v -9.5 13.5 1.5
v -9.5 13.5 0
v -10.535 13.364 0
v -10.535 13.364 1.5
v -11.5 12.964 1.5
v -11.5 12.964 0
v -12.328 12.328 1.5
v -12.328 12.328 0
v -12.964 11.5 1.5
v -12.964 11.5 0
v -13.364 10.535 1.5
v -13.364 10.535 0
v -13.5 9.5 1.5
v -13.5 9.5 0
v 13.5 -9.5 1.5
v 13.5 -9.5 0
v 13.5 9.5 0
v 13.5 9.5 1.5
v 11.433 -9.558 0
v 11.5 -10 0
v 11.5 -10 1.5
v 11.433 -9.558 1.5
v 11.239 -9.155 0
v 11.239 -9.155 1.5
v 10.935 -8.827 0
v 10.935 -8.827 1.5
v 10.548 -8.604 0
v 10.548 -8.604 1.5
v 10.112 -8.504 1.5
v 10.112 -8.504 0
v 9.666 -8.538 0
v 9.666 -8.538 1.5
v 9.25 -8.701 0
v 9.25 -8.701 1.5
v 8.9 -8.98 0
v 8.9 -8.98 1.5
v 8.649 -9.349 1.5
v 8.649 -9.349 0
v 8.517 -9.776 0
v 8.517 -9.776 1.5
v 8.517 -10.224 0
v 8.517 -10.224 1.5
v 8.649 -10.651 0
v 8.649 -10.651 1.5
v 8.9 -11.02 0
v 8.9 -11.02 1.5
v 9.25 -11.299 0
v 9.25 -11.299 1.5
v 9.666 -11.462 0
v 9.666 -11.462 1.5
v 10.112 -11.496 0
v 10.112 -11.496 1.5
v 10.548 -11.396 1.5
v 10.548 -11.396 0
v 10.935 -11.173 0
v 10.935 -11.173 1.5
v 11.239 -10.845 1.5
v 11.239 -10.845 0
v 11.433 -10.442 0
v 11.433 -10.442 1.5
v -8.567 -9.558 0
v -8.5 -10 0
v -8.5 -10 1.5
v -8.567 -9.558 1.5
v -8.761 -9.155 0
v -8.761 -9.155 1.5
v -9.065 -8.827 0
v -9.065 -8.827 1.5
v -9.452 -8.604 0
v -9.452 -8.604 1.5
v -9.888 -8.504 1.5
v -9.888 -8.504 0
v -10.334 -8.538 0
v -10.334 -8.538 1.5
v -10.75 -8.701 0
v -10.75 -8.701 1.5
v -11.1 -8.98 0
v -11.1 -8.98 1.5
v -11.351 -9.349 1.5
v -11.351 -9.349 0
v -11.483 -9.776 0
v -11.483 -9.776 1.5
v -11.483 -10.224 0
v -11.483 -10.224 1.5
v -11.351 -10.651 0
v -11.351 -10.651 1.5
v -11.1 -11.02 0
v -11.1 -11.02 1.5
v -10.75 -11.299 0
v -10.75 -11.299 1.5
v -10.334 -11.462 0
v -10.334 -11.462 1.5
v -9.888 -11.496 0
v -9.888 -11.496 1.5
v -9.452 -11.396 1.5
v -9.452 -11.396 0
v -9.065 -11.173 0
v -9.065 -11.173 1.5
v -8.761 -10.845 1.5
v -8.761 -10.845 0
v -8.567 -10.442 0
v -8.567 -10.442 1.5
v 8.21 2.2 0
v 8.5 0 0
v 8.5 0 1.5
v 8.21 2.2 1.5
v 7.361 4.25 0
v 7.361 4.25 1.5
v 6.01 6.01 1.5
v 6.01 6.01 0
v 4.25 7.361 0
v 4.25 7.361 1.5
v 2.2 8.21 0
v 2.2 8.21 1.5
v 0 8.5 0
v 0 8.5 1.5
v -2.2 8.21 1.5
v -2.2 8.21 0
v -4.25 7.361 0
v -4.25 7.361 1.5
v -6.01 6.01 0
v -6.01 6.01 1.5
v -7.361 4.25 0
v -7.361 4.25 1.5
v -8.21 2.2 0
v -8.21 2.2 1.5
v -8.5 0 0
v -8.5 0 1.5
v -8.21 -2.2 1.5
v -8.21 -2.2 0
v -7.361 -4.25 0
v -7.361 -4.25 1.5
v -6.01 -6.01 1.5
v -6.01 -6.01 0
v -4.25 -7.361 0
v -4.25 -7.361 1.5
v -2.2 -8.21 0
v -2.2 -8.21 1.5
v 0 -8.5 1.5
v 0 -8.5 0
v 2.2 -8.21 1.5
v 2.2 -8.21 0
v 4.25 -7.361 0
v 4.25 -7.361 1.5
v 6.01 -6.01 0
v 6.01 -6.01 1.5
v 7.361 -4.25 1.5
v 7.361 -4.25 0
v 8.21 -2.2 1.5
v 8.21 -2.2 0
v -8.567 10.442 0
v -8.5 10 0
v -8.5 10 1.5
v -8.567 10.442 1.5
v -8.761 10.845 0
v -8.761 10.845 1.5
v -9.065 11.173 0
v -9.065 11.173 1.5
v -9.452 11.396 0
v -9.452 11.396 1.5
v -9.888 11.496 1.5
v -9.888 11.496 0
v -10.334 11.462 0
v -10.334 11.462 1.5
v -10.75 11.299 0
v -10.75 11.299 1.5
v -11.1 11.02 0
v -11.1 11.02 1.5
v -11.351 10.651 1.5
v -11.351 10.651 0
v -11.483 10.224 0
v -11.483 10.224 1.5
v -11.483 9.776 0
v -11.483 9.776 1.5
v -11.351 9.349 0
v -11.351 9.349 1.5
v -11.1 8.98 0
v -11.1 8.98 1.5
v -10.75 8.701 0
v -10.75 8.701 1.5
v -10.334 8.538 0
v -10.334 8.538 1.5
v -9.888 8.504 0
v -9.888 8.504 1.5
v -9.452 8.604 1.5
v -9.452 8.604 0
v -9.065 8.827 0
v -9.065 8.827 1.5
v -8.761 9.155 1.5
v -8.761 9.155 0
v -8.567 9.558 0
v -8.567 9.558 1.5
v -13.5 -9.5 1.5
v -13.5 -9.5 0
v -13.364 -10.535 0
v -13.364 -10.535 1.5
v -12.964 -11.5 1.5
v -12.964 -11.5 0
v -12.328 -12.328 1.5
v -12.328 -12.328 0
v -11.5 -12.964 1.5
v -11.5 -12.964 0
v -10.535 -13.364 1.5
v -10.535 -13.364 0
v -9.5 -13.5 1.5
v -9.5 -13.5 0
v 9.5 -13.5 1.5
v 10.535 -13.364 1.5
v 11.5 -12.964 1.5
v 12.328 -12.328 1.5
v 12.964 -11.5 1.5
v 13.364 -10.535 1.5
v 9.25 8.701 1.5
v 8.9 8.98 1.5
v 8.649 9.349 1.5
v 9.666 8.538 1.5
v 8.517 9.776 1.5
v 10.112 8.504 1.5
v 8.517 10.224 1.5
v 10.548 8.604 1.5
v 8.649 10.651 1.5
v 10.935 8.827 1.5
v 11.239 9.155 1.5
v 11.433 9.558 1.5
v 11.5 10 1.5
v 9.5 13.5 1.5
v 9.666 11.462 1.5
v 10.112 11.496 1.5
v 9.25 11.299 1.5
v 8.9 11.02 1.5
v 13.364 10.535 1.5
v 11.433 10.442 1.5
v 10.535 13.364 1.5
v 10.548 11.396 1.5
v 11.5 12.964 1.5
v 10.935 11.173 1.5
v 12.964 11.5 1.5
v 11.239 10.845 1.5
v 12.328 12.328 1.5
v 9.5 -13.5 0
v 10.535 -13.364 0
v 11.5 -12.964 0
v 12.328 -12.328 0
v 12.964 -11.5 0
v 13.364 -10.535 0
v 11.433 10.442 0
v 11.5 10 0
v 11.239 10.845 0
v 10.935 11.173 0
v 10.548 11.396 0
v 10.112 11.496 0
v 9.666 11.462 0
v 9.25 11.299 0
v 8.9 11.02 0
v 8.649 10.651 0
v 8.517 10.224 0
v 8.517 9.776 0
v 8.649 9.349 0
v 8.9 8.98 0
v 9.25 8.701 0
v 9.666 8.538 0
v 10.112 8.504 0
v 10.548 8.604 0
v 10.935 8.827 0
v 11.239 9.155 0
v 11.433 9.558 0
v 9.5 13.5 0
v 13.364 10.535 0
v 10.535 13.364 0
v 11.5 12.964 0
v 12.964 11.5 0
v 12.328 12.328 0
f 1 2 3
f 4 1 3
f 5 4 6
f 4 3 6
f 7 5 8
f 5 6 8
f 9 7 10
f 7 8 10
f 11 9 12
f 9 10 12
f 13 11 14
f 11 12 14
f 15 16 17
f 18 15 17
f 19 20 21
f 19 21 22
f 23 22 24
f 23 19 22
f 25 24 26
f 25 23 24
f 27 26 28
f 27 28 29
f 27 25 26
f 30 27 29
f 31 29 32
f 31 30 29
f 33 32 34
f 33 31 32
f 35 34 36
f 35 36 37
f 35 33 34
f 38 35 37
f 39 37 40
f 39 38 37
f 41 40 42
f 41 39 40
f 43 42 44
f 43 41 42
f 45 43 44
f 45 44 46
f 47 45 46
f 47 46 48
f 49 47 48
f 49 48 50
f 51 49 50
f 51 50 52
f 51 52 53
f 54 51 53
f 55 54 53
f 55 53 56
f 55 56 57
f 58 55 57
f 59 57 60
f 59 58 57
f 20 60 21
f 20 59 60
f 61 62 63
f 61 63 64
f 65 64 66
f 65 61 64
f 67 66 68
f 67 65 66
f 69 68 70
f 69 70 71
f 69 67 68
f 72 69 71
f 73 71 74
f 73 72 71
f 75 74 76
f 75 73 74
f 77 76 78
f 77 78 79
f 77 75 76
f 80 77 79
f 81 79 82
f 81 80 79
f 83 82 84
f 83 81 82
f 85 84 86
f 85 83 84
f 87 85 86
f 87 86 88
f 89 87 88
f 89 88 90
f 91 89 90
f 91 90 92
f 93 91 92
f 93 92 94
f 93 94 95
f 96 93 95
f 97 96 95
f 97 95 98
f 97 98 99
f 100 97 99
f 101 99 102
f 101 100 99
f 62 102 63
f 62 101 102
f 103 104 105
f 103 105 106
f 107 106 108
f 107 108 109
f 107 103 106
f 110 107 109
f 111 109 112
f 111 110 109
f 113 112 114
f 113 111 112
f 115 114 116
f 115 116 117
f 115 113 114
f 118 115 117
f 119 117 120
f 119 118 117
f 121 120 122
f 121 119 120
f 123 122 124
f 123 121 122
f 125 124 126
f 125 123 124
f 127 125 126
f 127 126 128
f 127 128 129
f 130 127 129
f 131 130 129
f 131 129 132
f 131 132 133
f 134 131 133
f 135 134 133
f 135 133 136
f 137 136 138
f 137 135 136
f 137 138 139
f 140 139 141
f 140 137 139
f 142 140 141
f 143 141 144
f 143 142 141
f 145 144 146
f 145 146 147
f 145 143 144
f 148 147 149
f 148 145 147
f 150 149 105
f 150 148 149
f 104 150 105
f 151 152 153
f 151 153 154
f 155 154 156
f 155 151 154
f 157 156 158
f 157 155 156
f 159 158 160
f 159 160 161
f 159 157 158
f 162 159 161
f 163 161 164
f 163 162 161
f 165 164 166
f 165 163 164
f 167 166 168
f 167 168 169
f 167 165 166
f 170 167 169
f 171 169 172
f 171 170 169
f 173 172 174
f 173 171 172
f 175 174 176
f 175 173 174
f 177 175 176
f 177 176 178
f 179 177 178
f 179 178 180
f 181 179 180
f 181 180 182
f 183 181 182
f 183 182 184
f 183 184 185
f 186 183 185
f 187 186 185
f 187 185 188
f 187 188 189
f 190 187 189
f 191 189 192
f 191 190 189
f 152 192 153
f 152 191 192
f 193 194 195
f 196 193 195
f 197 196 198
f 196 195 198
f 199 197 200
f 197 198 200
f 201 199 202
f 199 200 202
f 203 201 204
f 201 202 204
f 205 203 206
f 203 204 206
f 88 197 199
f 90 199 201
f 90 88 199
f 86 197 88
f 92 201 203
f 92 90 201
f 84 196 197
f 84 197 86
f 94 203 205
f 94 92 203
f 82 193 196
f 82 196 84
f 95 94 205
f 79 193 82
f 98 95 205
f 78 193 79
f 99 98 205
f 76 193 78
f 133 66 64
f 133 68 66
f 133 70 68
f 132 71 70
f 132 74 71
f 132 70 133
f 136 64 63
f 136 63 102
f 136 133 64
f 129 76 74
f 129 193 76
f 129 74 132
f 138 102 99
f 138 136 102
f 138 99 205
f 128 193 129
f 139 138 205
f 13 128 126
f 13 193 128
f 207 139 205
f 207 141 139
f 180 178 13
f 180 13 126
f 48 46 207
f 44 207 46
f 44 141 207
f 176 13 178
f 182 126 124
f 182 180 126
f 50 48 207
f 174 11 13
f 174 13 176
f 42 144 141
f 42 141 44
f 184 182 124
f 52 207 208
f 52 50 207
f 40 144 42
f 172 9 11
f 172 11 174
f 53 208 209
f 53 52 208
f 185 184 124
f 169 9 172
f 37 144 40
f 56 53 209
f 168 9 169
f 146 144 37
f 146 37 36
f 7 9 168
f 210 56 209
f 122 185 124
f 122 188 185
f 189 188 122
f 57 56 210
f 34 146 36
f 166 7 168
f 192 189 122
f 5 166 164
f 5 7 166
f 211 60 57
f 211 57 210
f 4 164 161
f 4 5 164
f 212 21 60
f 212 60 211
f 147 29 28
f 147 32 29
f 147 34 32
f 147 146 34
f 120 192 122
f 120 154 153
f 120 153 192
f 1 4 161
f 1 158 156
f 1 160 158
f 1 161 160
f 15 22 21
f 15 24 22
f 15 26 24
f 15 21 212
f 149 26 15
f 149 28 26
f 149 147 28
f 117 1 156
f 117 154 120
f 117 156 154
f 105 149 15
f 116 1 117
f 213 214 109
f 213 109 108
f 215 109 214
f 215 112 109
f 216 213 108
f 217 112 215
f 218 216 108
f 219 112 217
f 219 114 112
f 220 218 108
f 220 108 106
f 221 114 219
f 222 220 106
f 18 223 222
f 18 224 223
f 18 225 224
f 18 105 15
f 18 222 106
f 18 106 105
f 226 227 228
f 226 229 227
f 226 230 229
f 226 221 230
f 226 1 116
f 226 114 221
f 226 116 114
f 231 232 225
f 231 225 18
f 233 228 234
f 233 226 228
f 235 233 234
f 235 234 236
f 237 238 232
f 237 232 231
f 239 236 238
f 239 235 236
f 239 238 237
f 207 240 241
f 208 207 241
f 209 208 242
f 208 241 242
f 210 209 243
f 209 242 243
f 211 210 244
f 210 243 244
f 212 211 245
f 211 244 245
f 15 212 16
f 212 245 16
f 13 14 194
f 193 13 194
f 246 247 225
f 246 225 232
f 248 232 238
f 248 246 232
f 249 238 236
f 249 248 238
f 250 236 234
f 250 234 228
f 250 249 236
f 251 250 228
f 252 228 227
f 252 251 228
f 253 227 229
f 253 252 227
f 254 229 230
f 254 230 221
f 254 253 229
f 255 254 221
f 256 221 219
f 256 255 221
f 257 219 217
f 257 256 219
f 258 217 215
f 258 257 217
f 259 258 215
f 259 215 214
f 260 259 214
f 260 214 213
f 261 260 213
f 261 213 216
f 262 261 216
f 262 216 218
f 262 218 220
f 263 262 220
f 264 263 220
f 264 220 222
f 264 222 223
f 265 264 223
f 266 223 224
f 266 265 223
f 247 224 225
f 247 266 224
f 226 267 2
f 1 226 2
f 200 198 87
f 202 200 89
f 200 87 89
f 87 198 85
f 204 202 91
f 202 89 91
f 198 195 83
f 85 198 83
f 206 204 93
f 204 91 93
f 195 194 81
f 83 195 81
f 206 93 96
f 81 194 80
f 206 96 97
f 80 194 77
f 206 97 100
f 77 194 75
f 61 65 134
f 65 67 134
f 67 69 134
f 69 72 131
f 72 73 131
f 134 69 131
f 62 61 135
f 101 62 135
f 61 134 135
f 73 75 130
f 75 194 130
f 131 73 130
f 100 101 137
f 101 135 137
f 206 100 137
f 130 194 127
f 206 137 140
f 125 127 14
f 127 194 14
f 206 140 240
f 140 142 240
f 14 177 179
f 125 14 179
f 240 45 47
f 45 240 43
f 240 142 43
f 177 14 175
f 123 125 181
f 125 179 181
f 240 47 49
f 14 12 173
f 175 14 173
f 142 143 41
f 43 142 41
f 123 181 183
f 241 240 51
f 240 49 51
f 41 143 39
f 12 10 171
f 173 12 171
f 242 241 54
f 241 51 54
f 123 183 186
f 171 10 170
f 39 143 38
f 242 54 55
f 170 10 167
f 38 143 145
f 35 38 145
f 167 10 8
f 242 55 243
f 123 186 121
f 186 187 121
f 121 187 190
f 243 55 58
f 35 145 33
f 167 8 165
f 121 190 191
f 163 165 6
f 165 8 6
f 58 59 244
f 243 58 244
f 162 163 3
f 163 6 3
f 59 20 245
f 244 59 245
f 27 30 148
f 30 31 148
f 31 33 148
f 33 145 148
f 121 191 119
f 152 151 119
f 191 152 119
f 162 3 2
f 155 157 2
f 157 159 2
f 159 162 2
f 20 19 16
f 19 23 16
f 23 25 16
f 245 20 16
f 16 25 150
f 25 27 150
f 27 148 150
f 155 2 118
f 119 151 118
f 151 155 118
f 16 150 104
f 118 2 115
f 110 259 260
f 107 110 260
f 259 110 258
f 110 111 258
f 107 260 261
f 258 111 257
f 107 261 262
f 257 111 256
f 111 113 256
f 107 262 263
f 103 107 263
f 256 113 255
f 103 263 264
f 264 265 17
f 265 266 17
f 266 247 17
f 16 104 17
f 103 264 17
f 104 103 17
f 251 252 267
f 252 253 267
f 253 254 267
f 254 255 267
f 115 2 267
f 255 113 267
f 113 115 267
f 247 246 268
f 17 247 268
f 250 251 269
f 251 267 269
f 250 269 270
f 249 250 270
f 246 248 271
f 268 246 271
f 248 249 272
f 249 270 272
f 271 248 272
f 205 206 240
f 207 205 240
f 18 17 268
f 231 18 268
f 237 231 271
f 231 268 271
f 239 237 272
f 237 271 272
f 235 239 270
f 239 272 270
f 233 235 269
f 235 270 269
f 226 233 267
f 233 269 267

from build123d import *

# Parameters (mm, degrees)
F0_R     = 1.5
F0_R_2   = 8.5
F1_DEPTH = 1.5


with BuildPart() as f1:
    # F0 (on Top) → F1 (new body)
    with BuildSketch(Plane.XY):
        with BuildLine():
            ThreePointArc((13.5, 9.5), (12.328427, 12.328427), (9.5, 13.5))
            Line((9.5, 13.5), (-9.5, 13.5))
            ThreePointArc((-9.5, 13.5), (-12.328427, 12.328427), (-13.5, 9.5))
            Line((-13.5, 9.5), (-13.5, -9.5))
            ThreePointArc((-13.5, -9.5), (-12.328427, -12.328427), (-9.5, -13.5))
            Line((-9.5, -13.5), (9.5, -13.5))
            ThreePointArc((9.5, -13.5), (12.328427, -12.328427), (13.5, -9.5))
            Line((13.5, -9.5), (13.5, 9.5))
        make_face()
        with Locations((-10, -10)):
            Circle(F0_R, mode=Mode.SUBTRACT)
        with Locations((10, -10)):
            Circle(F0_R, mode=Mode.SUBTRACT)
        with Locations((-10, 10)):
            Circle(F0_R, mode=Mode.SUBTRACT)
        Circle(F0_R_2, mode=Mode.SUBTRACT)
        with Locations((10, 10)):
            Circle(F0_R, mode=Mode.SUBTRACT)
    extrude(amount=F1_DEPTH)


solid = f1.part
